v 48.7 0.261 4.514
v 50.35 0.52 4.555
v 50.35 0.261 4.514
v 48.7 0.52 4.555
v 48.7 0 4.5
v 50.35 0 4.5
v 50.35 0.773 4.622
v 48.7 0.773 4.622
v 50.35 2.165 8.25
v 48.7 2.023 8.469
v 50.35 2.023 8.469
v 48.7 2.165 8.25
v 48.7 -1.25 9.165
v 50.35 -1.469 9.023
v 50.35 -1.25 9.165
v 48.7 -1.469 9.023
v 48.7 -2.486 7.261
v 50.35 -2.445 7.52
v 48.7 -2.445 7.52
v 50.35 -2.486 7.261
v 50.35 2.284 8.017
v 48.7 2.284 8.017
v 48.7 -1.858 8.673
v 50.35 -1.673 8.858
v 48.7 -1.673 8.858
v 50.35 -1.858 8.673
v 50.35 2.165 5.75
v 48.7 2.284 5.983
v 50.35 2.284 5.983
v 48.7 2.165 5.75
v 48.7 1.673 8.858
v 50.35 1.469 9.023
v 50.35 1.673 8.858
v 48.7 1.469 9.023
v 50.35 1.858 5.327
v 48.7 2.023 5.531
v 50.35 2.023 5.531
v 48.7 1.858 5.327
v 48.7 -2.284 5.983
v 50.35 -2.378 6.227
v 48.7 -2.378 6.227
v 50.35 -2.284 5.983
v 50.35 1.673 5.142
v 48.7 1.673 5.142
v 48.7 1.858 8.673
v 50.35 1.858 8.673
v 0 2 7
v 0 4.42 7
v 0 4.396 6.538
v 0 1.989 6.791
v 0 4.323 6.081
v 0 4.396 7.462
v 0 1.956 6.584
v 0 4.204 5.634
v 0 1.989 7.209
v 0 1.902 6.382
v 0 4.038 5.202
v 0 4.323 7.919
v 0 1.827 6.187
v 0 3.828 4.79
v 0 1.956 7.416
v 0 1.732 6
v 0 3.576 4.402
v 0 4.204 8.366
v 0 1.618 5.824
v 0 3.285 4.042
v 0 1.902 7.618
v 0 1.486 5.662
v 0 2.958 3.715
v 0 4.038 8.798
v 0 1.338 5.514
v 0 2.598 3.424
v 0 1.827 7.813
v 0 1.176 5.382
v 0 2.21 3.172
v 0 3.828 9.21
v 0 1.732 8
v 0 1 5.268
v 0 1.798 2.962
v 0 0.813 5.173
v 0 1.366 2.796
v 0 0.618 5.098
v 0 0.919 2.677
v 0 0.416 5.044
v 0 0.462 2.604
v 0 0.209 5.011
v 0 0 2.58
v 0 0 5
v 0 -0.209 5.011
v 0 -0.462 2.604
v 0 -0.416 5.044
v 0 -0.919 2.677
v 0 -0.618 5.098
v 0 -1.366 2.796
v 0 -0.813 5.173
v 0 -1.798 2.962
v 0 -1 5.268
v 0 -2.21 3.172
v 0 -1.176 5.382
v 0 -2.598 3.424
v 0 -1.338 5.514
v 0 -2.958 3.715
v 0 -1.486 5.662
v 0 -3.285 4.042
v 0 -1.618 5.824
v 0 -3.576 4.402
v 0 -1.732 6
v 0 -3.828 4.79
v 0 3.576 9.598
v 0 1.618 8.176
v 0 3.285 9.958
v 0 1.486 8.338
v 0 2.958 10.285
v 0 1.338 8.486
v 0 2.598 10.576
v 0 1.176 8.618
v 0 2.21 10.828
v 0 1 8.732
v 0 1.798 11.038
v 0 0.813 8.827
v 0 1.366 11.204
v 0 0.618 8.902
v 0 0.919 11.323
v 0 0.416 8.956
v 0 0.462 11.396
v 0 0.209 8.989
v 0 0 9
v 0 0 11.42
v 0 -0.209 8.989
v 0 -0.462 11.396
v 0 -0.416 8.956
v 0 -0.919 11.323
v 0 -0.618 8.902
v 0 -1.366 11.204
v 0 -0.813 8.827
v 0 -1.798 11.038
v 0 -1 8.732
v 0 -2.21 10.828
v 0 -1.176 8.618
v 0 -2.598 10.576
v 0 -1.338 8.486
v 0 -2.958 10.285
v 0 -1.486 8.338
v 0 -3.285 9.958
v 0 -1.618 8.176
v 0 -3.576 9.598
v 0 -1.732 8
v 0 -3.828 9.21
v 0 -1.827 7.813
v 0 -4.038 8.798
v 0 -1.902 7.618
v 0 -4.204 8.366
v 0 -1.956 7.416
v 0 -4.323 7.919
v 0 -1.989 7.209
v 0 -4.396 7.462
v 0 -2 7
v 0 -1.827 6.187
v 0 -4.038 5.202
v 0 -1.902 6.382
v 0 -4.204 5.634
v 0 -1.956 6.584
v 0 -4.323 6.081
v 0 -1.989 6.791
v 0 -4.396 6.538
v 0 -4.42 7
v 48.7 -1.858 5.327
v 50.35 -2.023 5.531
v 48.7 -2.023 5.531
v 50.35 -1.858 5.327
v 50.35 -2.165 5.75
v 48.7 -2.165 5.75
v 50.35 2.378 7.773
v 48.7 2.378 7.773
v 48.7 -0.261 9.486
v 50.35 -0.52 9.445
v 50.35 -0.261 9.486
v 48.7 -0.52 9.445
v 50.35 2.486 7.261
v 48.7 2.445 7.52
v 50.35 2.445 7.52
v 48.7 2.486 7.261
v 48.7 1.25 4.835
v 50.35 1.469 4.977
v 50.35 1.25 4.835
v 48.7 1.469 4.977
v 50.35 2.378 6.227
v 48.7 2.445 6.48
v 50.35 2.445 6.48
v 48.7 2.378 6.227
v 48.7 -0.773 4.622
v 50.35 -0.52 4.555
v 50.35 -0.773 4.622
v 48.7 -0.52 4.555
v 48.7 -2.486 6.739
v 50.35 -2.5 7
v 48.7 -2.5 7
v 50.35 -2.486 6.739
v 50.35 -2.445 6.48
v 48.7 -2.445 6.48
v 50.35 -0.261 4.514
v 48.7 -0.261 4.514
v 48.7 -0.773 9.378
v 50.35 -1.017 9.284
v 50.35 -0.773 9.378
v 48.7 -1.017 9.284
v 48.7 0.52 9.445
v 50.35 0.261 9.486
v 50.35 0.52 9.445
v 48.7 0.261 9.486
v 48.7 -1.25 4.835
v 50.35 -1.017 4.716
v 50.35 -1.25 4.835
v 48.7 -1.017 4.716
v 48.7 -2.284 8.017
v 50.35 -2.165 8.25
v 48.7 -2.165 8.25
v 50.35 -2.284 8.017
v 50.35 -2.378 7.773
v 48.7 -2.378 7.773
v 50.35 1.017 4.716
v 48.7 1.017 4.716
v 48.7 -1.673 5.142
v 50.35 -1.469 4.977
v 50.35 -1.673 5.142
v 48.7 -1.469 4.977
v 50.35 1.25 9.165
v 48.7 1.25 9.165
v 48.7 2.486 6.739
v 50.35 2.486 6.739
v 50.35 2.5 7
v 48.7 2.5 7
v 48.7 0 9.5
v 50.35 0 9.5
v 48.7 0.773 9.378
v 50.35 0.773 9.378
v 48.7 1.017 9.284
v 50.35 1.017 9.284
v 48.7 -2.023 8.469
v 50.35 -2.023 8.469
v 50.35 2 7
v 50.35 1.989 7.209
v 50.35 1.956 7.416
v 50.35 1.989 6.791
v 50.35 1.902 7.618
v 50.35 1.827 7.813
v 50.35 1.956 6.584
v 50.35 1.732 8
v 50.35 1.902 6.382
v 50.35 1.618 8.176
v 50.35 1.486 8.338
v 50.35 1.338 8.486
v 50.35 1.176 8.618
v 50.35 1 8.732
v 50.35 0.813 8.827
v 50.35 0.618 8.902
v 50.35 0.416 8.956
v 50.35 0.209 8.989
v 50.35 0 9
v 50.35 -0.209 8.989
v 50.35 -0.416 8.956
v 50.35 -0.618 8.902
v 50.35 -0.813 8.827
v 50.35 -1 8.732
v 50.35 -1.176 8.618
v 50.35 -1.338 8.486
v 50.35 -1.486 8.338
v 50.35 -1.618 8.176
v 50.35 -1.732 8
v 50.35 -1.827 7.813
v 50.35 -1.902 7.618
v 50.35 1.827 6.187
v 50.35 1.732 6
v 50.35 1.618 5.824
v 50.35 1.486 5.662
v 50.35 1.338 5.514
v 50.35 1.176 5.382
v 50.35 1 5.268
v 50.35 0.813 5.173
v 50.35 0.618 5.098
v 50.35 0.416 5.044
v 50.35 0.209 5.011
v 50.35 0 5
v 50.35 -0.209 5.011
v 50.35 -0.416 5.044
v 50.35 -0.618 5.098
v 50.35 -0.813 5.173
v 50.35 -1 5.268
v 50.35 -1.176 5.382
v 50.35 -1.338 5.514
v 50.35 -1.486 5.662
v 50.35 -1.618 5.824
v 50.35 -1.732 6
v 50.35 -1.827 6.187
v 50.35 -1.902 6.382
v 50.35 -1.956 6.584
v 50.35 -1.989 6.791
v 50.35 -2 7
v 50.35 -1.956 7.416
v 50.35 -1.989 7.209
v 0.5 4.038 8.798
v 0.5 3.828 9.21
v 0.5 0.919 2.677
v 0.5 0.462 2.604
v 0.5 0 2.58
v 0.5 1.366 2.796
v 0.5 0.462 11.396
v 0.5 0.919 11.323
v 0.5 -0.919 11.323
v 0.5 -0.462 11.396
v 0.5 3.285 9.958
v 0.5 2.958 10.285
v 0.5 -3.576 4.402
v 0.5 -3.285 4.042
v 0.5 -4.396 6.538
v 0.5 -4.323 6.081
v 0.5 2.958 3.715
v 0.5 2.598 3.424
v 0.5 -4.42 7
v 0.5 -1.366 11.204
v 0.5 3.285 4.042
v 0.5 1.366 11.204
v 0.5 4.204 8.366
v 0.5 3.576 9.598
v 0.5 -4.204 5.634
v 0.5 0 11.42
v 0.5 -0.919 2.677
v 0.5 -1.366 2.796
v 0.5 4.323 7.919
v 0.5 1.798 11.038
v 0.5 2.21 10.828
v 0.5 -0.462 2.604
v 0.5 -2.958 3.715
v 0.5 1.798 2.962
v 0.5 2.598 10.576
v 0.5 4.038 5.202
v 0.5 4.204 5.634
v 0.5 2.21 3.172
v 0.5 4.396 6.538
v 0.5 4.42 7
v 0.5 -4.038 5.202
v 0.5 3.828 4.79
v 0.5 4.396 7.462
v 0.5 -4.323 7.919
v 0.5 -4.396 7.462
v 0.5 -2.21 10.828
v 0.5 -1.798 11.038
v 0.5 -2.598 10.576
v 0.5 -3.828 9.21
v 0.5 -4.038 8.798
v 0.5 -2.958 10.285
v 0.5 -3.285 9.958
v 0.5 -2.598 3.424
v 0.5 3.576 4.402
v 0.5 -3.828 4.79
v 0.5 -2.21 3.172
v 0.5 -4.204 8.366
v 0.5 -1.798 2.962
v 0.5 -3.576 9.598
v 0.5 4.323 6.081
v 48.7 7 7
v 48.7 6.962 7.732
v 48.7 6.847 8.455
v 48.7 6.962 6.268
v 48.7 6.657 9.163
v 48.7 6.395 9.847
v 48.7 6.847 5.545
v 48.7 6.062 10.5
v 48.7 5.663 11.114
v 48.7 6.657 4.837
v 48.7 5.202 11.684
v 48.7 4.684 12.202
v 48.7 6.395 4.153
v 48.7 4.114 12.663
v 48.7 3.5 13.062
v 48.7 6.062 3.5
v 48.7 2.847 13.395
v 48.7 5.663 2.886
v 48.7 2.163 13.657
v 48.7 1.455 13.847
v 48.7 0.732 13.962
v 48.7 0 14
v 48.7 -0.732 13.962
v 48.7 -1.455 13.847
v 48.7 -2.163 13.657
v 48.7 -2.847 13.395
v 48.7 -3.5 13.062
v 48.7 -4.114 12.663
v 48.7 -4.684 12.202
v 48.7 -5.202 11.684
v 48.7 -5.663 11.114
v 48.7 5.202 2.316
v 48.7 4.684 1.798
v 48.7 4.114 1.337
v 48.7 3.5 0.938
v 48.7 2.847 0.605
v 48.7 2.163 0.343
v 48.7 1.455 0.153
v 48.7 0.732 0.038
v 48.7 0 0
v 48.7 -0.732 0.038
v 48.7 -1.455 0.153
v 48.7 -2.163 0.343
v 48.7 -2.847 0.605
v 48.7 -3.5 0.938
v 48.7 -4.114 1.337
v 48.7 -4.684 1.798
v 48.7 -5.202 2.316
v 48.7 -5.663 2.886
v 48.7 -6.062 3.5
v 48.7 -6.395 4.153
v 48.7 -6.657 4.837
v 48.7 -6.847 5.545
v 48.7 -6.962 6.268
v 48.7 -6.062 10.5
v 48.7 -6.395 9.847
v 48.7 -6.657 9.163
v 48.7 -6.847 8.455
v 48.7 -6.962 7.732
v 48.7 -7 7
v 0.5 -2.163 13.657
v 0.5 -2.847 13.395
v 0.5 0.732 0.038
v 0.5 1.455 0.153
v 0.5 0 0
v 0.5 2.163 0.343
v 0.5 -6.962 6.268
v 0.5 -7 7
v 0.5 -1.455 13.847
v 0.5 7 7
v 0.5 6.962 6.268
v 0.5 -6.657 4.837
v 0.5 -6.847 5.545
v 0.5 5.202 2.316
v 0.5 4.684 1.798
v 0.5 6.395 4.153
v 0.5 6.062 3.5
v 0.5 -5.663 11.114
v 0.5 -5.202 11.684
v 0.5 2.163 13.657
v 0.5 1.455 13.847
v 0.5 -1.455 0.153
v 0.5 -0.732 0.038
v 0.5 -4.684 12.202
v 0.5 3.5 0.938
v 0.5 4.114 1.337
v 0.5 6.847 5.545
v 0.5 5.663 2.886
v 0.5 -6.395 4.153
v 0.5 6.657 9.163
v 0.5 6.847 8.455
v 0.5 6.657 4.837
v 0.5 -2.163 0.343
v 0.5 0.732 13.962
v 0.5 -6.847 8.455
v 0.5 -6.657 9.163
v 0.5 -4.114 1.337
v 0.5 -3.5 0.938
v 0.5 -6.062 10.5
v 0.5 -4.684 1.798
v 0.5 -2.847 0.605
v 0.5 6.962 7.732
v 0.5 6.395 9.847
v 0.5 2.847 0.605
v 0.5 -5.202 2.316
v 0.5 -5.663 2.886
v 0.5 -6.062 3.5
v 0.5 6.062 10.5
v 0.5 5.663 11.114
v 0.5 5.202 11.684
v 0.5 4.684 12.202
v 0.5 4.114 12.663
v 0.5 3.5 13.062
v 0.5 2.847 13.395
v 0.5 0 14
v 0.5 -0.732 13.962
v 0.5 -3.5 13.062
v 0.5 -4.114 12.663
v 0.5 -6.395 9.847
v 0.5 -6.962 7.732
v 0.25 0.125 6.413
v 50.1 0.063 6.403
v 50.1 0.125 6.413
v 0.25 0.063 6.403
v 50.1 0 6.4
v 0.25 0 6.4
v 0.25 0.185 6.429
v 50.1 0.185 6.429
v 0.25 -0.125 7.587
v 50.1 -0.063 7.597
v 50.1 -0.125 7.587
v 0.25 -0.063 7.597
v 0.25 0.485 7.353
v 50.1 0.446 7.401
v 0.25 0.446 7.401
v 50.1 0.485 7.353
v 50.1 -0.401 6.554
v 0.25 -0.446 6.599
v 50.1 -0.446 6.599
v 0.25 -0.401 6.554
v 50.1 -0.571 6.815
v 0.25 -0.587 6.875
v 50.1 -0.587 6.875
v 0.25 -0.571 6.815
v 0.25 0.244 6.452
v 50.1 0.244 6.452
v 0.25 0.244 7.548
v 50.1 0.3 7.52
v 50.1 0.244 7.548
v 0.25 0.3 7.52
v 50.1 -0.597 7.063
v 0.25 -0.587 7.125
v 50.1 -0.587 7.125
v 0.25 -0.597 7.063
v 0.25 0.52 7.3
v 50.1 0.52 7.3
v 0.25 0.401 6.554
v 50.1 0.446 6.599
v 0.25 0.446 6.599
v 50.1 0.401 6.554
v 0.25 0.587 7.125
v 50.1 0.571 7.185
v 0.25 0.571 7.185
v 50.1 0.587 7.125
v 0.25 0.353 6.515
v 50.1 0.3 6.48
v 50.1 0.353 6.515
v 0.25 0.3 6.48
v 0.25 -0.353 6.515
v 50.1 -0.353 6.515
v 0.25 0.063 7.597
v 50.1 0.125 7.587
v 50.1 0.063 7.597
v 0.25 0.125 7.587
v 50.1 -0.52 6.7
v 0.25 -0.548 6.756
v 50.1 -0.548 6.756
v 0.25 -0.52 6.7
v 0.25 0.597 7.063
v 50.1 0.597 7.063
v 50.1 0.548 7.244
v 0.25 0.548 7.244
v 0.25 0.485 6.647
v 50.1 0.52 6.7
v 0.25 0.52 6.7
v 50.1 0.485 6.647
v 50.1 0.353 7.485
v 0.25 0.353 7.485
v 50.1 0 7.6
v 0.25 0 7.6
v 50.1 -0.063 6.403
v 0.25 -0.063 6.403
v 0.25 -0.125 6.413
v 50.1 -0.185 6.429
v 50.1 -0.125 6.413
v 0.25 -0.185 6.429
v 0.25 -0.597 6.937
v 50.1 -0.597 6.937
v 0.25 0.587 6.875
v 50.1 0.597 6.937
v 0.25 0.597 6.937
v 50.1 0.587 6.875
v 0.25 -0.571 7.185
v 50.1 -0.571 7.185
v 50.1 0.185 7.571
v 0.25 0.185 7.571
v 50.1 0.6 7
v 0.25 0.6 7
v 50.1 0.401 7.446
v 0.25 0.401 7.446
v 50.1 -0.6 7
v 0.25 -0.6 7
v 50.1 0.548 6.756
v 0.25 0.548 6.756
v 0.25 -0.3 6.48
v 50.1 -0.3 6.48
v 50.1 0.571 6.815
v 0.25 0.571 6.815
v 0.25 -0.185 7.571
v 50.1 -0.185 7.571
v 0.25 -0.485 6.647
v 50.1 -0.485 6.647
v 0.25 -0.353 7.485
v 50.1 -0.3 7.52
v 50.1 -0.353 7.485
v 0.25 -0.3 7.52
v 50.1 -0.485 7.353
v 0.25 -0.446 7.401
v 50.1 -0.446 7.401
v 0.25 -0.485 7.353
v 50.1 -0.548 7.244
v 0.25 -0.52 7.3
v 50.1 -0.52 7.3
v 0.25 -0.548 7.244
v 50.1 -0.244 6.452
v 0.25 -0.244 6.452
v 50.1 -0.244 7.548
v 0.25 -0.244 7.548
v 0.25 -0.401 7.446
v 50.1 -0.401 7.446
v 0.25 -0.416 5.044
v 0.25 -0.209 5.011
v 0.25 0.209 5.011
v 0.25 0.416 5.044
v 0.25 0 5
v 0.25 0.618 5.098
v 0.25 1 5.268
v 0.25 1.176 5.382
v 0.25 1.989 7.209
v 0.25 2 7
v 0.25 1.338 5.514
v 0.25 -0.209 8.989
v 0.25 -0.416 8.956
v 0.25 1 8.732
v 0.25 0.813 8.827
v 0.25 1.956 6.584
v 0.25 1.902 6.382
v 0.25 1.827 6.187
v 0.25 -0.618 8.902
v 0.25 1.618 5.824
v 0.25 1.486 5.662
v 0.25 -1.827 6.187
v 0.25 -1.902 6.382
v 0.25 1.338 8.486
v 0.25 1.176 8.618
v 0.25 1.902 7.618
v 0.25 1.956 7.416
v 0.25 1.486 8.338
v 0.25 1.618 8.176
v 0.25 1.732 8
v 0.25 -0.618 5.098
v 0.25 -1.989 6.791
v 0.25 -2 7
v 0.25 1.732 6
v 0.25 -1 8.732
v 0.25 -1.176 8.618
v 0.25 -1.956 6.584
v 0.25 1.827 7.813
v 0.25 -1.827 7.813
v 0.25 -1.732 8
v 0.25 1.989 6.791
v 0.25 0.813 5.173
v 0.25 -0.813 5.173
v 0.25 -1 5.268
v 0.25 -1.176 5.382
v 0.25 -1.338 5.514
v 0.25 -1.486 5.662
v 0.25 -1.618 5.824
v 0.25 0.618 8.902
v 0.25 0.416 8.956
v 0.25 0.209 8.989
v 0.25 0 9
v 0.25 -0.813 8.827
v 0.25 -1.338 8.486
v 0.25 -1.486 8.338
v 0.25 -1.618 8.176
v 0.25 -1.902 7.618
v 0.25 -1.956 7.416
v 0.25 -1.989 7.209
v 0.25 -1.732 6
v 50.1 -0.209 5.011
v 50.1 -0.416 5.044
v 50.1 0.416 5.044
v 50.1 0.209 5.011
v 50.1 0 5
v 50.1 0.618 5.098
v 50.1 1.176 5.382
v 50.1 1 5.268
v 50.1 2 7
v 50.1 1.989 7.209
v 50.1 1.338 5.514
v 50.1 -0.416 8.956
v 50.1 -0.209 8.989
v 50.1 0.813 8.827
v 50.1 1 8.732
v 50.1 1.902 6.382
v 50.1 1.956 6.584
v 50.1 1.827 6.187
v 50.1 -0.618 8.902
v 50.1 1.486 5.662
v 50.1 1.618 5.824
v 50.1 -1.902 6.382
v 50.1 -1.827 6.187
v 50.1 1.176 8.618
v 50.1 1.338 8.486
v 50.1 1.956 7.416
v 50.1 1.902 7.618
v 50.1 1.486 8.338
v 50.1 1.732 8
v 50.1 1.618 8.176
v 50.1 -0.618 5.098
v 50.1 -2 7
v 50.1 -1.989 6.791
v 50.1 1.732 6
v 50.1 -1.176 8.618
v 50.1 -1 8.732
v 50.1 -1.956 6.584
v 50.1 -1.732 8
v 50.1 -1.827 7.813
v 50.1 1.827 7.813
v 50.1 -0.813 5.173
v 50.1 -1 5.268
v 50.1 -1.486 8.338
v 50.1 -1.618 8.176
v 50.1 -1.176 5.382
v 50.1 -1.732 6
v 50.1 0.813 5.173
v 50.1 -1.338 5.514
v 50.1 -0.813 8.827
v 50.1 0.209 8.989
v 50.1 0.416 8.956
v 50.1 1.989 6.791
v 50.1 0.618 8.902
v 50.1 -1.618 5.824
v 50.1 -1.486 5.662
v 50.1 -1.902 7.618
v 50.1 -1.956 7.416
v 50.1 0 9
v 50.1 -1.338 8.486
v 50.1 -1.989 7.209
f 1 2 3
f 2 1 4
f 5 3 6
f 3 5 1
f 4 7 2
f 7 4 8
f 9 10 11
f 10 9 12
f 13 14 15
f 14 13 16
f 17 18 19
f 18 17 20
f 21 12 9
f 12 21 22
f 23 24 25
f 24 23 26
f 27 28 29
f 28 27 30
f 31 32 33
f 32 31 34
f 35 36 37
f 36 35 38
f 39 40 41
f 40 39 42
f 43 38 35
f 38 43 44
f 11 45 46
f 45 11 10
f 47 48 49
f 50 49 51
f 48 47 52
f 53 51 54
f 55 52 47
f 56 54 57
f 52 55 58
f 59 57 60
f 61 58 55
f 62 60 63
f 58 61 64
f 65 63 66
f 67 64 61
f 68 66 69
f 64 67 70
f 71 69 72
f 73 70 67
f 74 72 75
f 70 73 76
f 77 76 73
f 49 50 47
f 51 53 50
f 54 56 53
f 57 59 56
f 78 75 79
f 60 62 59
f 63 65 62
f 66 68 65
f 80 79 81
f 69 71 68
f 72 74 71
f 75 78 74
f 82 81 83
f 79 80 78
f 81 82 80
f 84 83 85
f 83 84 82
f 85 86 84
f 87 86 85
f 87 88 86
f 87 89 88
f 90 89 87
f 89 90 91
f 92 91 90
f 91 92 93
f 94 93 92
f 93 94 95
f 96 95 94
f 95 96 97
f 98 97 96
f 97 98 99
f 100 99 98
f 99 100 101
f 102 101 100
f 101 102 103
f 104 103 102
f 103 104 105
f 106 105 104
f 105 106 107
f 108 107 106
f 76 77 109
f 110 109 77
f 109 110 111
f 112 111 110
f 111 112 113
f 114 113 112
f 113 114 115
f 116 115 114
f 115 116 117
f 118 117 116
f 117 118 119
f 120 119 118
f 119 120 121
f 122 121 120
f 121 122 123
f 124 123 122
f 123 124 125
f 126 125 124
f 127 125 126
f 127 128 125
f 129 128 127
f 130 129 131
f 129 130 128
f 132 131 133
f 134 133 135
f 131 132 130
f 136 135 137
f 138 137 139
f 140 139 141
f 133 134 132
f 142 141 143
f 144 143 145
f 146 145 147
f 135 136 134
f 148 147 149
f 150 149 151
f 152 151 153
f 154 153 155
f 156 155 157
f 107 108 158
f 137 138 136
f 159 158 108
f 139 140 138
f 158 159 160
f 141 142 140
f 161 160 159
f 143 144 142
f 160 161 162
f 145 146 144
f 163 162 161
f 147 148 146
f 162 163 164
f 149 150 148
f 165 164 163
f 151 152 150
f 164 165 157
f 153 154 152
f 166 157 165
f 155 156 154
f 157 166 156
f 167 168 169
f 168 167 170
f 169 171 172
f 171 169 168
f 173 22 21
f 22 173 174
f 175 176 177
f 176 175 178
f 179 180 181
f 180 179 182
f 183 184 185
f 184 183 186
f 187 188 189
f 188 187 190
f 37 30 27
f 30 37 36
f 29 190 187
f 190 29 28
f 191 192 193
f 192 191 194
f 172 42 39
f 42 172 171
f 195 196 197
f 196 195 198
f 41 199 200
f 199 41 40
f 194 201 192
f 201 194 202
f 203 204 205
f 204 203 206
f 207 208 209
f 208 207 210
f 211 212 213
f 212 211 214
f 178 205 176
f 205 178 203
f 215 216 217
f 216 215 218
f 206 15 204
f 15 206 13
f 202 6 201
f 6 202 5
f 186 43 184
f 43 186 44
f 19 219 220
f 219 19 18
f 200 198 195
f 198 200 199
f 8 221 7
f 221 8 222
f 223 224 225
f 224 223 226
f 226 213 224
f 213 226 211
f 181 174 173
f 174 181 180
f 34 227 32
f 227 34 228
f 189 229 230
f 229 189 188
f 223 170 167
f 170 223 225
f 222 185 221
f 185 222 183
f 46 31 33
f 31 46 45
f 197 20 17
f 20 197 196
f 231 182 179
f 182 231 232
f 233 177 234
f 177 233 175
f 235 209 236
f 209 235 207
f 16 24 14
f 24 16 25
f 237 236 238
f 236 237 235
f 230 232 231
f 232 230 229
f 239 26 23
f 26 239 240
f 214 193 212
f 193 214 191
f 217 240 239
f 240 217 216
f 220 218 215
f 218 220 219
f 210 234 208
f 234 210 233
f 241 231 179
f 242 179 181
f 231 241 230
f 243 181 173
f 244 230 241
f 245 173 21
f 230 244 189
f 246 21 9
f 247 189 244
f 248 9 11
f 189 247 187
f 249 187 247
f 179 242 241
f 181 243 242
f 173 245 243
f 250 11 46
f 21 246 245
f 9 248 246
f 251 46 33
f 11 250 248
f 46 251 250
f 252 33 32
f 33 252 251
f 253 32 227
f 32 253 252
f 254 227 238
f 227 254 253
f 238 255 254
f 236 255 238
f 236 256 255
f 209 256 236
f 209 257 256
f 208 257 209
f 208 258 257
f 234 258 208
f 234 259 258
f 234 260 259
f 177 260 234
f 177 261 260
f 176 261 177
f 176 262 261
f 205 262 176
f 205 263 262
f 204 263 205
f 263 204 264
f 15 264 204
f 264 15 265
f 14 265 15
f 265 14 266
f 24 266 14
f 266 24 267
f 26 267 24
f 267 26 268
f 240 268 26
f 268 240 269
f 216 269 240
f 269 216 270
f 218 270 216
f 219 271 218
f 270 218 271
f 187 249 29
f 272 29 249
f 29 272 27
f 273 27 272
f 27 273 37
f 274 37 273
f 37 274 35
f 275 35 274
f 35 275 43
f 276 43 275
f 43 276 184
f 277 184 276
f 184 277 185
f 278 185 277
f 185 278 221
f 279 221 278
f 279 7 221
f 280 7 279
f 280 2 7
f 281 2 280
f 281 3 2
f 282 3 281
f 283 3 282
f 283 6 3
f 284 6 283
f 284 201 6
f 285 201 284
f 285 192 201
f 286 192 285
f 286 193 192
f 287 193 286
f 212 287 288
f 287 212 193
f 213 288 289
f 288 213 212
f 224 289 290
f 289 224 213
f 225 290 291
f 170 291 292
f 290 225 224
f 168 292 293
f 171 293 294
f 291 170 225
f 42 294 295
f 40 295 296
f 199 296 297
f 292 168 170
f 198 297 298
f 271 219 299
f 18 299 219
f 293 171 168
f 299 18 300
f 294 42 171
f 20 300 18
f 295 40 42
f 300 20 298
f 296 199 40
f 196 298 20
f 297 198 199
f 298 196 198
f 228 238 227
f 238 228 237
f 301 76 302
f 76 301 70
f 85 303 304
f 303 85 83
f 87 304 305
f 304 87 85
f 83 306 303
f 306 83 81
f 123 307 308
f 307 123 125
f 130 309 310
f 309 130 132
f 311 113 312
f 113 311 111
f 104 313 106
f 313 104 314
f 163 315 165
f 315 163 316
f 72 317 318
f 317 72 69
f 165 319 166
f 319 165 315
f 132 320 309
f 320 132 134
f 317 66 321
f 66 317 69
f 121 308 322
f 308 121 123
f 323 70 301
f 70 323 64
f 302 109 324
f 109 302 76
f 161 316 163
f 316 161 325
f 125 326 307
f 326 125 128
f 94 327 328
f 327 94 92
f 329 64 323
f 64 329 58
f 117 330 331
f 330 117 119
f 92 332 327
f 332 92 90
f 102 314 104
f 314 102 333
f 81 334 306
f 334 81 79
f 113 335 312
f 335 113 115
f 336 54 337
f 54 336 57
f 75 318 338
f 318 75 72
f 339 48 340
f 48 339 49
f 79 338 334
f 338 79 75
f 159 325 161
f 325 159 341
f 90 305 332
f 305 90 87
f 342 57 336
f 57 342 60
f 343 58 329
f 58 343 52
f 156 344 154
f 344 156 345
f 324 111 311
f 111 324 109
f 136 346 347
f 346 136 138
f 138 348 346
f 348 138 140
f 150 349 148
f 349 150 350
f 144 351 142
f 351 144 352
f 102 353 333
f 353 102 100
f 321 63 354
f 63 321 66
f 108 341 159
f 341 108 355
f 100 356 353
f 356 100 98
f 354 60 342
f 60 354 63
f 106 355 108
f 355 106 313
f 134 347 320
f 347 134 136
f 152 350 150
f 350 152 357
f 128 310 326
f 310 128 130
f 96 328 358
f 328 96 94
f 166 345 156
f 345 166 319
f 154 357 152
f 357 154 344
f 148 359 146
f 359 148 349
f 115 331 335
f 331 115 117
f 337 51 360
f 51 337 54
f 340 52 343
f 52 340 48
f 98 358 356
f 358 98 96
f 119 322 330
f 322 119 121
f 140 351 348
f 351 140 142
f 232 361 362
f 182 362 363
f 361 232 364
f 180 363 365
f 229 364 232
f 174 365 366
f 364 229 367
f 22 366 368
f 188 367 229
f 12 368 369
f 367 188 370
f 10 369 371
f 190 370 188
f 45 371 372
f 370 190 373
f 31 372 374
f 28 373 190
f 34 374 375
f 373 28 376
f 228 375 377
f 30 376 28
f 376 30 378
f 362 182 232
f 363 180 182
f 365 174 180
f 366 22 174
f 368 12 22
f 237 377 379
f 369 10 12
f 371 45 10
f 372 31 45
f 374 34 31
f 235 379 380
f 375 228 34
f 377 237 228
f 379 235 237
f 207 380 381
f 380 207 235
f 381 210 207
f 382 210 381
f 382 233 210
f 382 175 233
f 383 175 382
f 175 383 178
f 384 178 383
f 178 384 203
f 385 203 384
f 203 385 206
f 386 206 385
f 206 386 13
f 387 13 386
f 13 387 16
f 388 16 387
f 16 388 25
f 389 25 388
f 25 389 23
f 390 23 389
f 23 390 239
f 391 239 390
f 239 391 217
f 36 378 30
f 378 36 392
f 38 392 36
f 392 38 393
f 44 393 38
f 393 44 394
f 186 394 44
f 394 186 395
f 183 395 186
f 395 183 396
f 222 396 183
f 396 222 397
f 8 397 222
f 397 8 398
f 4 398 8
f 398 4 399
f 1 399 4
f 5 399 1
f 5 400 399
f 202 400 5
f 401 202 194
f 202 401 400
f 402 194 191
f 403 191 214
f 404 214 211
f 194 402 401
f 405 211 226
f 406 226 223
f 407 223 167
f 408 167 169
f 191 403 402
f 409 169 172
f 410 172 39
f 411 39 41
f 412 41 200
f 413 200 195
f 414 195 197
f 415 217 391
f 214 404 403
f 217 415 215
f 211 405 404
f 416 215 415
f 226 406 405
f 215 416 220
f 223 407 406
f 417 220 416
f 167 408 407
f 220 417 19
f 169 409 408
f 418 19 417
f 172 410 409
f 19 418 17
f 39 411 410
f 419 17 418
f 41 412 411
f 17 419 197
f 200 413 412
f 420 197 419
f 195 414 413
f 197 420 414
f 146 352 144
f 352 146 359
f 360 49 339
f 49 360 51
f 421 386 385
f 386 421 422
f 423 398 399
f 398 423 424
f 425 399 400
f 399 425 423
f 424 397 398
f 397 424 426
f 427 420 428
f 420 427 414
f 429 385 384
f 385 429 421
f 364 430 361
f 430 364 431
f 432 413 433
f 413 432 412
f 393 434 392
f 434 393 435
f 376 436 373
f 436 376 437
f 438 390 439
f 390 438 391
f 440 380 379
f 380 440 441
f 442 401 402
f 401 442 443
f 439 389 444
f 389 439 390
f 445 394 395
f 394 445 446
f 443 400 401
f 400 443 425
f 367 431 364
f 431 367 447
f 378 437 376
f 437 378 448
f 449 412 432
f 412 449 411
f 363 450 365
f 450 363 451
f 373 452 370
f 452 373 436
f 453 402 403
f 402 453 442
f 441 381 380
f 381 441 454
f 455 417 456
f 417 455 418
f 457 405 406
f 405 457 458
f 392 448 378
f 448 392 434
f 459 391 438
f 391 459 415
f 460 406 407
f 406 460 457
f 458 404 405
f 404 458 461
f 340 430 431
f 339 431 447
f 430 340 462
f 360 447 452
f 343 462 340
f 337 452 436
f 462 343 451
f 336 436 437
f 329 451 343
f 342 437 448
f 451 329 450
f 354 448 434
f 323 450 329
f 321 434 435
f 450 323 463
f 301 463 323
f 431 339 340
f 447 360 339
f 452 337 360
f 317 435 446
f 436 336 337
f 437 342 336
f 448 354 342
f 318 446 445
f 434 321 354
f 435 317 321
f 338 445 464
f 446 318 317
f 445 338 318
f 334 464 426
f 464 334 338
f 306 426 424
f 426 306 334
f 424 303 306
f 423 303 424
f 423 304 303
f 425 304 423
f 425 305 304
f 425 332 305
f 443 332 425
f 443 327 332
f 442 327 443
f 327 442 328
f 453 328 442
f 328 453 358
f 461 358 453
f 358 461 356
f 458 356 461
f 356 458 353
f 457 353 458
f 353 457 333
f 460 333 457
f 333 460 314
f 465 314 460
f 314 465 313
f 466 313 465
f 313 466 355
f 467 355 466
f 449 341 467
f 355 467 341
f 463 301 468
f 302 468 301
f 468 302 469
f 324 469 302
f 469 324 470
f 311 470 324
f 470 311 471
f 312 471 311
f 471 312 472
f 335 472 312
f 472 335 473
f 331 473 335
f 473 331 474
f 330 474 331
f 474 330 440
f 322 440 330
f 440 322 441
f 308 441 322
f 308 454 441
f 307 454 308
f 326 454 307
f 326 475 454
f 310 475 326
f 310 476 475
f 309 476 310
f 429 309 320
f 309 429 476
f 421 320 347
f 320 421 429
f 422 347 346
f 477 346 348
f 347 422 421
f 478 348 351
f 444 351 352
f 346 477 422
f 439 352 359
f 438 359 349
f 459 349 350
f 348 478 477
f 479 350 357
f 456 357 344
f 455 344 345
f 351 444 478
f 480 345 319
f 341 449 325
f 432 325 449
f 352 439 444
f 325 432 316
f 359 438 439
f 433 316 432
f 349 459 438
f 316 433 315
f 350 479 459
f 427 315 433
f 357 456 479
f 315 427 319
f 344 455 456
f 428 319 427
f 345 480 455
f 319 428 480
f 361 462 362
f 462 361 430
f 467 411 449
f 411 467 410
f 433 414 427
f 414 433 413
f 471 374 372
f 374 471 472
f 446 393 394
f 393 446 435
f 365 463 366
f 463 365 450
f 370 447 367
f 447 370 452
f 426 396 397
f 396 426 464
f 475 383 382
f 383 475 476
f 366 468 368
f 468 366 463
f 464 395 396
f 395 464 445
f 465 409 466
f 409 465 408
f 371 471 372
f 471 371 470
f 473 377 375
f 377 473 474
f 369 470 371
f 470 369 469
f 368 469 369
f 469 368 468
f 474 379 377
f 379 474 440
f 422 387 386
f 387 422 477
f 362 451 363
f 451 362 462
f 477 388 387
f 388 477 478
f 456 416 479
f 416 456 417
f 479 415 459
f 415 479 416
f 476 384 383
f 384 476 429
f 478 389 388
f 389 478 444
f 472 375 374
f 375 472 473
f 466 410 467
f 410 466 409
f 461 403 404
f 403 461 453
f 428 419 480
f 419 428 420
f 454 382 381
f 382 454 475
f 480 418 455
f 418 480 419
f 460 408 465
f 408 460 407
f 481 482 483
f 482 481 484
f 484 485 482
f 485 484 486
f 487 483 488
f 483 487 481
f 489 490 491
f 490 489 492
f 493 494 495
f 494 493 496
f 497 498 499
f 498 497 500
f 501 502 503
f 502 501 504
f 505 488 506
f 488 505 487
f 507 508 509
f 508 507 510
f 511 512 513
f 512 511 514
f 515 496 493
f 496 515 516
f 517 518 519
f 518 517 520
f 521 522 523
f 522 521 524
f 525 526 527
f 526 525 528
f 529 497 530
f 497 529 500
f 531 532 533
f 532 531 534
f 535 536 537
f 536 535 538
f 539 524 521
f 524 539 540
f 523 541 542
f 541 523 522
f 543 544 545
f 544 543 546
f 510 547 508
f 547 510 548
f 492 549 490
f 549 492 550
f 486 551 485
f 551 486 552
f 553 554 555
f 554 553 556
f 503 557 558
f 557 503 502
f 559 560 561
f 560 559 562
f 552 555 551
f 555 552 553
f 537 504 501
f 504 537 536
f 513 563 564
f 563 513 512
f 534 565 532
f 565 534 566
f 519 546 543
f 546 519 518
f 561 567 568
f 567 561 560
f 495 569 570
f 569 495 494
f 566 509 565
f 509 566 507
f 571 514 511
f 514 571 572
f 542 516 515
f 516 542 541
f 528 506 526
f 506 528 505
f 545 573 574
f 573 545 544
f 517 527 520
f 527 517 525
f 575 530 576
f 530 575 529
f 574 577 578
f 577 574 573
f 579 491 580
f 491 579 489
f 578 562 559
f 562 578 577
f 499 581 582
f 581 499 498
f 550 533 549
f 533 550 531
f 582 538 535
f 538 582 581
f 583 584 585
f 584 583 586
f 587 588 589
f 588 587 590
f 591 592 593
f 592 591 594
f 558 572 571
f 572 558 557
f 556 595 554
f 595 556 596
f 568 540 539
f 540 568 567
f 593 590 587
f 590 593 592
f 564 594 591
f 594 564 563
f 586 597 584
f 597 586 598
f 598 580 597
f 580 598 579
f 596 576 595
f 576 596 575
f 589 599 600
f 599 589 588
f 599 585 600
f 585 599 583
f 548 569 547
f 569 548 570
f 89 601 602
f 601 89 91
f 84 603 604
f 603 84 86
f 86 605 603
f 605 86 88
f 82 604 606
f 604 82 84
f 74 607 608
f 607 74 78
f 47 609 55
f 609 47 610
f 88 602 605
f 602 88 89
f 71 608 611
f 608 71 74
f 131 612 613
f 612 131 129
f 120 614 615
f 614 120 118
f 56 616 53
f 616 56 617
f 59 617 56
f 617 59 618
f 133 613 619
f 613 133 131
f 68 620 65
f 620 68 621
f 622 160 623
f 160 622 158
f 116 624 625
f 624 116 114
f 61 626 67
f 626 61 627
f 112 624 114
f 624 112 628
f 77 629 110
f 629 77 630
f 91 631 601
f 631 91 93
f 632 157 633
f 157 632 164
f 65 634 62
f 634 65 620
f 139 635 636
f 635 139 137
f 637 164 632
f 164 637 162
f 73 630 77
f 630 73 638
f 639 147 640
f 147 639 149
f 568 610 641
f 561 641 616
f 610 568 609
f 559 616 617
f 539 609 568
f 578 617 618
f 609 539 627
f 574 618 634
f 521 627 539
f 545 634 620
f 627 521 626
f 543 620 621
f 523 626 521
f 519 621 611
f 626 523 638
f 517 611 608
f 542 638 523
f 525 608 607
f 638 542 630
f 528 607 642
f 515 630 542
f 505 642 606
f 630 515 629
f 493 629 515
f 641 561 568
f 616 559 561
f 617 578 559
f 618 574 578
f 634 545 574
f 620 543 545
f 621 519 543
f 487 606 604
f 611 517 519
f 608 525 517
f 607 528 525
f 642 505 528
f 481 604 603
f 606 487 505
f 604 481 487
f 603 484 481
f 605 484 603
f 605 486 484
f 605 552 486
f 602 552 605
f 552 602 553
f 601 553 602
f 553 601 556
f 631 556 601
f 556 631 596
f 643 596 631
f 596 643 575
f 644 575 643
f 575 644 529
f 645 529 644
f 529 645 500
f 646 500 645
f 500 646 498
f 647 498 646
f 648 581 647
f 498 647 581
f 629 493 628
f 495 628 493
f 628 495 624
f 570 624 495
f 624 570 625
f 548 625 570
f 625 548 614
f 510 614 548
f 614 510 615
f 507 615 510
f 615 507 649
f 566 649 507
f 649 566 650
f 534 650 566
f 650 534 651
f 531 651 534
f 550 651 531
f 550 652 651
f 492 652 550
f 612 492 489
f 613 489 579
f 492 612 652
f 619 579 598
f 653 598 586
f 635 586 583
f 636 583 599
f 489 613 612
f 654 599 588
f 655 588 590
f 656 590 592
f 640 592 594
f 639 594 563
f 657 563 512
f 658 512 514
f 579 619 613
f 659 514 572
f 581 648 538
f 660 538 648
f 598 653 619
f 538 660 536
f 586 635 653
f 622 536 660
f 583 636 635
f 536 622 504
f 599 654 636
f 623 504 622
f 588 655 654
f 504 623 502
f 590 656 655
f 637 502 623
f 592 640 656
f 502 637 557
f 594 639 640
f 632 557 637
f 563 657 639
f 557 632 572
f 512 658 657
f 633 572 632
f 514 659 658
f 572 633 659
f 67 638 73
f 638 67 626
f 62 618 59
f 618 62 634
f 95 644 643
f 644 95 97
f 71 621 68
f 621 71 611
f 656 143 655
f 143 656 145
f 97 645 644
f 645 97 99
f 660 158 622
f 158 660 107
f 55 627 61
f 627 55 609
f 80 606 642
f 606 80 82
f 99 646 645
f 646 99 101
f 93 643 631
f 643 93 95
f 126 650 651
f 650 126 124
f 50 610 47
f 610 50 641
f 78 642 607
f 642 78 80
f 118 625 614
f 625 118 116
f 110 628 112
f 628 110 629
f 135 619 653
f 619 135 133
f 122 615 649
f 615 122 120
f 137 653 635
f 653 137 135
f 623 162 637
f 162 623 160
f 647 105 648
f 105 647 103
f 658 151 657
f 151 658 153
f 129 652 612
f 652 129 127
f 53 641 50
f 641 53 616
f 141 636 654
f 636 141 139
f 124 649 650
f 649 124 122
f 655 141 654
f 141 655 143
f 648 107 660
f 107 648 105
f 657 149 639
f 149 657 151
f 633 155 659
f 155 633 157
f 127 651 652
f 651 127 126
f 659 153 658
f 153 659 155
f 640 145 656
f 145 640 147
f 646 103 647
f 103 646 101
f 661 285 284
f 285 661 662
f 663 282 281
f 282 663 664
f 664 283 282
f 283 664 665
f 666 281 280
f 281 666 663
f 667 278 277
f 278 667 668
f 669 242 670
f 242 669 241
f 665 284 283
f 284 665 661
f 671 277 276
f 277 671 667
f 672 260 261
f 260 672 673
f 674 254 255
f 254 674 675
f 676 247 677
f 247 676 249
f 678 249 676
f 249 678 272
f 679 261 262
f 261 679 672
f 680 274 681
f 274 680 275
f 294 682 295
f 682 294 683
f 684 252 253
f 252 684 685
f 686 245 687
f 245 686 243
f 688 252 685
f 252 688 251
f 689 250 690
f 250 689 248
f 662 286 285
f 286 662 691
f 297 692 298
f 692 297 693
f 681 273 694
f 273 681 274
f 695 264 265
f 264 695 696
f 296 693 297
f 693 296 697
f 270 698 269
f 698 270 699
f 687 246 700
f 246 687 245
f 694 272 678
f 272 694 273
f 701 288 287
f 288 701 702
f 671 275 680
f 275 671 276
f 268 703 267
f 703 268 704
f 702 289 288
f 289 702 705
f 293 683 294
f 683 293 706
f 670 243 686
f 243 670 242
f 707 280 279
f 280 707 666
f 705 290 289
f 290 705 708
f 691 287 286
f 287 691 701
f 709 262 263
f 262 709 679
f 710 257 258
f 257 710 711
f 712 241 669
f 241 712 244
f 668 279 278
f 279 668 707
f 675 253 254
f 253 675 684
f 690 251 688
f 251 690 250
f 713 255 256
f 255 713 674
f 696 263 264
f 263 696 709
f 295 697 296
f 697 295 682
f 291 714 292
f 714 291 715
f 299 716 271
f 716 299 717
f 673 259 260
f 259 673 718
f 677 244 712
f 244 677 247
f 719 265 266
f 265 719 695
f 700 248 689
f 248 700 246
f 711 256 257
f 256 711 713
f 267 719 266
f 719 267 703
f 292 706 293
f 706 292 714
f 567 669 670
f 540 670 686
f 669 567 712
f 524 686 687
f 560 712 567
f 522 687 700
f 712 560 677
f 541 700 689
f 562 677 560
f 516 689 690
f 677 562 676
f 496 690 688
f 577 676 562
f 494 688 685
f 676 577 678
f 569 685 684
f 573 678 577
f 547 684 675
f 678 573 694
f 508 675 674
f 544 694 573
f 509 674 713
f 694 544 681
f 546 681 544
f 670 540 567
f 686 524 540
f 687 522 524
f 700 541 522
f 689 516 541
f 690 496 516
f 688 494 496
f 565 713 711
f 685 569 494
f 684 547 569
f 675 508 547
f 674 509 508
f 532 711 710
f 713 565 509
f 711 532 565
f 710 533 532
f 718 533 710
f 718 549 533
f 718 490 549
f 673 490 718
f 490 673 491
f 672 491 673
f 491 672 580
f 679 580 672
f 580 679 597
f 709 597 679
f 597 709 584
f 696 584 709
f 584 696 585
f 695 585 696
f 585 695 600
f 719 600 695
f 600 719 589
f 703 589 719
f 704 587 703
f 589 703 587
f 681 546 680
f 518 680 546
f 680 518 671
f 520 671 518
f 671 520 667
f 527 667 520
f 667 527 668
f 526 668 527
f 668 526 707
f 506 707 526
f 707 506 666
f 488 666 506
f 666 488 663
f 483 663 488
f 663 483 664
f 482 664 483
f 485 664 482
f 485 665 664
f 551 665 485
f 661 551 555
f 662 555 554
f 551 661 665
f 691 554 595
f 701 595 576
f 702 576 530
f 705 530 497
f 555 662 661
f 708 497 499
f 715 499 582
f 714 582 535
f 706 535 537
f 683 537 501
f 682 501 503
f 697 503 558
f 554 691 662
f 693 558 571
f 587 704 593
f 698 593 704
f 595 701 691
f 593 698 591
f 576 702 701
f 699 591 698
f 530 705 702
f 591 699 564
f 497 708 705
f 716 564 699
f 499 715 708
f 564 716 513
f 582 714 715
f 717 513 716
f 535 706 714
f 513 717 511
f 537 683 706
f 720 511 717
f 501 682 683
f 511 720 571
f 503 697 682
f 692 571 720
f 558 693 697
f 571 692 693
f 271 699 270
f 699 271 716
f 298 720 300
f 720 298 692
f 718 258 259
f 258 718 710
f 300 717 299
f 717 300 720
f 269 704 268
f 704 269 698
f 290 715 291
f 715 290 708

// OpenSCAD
$fn=60;

module main(){
   color("red") cylinder (50.35,2.5,2.5);
     color("green")cylinder (48.7,4.42,4.42);
    translate ([0,0,.5])
     color("blue")cylinder (48.2,7,7);
};

translate ([0,0,7])
rotate([0,90,0])
difference (){
main();
    translate ([0,0,-1])
    cylinder (55,.6,.6);
    
    translate ([0,0,-1])
    cylinder (1.25,2,2);
    translate ([0,0,50.1])
    cylinder (1.5,2,2);
};
    
